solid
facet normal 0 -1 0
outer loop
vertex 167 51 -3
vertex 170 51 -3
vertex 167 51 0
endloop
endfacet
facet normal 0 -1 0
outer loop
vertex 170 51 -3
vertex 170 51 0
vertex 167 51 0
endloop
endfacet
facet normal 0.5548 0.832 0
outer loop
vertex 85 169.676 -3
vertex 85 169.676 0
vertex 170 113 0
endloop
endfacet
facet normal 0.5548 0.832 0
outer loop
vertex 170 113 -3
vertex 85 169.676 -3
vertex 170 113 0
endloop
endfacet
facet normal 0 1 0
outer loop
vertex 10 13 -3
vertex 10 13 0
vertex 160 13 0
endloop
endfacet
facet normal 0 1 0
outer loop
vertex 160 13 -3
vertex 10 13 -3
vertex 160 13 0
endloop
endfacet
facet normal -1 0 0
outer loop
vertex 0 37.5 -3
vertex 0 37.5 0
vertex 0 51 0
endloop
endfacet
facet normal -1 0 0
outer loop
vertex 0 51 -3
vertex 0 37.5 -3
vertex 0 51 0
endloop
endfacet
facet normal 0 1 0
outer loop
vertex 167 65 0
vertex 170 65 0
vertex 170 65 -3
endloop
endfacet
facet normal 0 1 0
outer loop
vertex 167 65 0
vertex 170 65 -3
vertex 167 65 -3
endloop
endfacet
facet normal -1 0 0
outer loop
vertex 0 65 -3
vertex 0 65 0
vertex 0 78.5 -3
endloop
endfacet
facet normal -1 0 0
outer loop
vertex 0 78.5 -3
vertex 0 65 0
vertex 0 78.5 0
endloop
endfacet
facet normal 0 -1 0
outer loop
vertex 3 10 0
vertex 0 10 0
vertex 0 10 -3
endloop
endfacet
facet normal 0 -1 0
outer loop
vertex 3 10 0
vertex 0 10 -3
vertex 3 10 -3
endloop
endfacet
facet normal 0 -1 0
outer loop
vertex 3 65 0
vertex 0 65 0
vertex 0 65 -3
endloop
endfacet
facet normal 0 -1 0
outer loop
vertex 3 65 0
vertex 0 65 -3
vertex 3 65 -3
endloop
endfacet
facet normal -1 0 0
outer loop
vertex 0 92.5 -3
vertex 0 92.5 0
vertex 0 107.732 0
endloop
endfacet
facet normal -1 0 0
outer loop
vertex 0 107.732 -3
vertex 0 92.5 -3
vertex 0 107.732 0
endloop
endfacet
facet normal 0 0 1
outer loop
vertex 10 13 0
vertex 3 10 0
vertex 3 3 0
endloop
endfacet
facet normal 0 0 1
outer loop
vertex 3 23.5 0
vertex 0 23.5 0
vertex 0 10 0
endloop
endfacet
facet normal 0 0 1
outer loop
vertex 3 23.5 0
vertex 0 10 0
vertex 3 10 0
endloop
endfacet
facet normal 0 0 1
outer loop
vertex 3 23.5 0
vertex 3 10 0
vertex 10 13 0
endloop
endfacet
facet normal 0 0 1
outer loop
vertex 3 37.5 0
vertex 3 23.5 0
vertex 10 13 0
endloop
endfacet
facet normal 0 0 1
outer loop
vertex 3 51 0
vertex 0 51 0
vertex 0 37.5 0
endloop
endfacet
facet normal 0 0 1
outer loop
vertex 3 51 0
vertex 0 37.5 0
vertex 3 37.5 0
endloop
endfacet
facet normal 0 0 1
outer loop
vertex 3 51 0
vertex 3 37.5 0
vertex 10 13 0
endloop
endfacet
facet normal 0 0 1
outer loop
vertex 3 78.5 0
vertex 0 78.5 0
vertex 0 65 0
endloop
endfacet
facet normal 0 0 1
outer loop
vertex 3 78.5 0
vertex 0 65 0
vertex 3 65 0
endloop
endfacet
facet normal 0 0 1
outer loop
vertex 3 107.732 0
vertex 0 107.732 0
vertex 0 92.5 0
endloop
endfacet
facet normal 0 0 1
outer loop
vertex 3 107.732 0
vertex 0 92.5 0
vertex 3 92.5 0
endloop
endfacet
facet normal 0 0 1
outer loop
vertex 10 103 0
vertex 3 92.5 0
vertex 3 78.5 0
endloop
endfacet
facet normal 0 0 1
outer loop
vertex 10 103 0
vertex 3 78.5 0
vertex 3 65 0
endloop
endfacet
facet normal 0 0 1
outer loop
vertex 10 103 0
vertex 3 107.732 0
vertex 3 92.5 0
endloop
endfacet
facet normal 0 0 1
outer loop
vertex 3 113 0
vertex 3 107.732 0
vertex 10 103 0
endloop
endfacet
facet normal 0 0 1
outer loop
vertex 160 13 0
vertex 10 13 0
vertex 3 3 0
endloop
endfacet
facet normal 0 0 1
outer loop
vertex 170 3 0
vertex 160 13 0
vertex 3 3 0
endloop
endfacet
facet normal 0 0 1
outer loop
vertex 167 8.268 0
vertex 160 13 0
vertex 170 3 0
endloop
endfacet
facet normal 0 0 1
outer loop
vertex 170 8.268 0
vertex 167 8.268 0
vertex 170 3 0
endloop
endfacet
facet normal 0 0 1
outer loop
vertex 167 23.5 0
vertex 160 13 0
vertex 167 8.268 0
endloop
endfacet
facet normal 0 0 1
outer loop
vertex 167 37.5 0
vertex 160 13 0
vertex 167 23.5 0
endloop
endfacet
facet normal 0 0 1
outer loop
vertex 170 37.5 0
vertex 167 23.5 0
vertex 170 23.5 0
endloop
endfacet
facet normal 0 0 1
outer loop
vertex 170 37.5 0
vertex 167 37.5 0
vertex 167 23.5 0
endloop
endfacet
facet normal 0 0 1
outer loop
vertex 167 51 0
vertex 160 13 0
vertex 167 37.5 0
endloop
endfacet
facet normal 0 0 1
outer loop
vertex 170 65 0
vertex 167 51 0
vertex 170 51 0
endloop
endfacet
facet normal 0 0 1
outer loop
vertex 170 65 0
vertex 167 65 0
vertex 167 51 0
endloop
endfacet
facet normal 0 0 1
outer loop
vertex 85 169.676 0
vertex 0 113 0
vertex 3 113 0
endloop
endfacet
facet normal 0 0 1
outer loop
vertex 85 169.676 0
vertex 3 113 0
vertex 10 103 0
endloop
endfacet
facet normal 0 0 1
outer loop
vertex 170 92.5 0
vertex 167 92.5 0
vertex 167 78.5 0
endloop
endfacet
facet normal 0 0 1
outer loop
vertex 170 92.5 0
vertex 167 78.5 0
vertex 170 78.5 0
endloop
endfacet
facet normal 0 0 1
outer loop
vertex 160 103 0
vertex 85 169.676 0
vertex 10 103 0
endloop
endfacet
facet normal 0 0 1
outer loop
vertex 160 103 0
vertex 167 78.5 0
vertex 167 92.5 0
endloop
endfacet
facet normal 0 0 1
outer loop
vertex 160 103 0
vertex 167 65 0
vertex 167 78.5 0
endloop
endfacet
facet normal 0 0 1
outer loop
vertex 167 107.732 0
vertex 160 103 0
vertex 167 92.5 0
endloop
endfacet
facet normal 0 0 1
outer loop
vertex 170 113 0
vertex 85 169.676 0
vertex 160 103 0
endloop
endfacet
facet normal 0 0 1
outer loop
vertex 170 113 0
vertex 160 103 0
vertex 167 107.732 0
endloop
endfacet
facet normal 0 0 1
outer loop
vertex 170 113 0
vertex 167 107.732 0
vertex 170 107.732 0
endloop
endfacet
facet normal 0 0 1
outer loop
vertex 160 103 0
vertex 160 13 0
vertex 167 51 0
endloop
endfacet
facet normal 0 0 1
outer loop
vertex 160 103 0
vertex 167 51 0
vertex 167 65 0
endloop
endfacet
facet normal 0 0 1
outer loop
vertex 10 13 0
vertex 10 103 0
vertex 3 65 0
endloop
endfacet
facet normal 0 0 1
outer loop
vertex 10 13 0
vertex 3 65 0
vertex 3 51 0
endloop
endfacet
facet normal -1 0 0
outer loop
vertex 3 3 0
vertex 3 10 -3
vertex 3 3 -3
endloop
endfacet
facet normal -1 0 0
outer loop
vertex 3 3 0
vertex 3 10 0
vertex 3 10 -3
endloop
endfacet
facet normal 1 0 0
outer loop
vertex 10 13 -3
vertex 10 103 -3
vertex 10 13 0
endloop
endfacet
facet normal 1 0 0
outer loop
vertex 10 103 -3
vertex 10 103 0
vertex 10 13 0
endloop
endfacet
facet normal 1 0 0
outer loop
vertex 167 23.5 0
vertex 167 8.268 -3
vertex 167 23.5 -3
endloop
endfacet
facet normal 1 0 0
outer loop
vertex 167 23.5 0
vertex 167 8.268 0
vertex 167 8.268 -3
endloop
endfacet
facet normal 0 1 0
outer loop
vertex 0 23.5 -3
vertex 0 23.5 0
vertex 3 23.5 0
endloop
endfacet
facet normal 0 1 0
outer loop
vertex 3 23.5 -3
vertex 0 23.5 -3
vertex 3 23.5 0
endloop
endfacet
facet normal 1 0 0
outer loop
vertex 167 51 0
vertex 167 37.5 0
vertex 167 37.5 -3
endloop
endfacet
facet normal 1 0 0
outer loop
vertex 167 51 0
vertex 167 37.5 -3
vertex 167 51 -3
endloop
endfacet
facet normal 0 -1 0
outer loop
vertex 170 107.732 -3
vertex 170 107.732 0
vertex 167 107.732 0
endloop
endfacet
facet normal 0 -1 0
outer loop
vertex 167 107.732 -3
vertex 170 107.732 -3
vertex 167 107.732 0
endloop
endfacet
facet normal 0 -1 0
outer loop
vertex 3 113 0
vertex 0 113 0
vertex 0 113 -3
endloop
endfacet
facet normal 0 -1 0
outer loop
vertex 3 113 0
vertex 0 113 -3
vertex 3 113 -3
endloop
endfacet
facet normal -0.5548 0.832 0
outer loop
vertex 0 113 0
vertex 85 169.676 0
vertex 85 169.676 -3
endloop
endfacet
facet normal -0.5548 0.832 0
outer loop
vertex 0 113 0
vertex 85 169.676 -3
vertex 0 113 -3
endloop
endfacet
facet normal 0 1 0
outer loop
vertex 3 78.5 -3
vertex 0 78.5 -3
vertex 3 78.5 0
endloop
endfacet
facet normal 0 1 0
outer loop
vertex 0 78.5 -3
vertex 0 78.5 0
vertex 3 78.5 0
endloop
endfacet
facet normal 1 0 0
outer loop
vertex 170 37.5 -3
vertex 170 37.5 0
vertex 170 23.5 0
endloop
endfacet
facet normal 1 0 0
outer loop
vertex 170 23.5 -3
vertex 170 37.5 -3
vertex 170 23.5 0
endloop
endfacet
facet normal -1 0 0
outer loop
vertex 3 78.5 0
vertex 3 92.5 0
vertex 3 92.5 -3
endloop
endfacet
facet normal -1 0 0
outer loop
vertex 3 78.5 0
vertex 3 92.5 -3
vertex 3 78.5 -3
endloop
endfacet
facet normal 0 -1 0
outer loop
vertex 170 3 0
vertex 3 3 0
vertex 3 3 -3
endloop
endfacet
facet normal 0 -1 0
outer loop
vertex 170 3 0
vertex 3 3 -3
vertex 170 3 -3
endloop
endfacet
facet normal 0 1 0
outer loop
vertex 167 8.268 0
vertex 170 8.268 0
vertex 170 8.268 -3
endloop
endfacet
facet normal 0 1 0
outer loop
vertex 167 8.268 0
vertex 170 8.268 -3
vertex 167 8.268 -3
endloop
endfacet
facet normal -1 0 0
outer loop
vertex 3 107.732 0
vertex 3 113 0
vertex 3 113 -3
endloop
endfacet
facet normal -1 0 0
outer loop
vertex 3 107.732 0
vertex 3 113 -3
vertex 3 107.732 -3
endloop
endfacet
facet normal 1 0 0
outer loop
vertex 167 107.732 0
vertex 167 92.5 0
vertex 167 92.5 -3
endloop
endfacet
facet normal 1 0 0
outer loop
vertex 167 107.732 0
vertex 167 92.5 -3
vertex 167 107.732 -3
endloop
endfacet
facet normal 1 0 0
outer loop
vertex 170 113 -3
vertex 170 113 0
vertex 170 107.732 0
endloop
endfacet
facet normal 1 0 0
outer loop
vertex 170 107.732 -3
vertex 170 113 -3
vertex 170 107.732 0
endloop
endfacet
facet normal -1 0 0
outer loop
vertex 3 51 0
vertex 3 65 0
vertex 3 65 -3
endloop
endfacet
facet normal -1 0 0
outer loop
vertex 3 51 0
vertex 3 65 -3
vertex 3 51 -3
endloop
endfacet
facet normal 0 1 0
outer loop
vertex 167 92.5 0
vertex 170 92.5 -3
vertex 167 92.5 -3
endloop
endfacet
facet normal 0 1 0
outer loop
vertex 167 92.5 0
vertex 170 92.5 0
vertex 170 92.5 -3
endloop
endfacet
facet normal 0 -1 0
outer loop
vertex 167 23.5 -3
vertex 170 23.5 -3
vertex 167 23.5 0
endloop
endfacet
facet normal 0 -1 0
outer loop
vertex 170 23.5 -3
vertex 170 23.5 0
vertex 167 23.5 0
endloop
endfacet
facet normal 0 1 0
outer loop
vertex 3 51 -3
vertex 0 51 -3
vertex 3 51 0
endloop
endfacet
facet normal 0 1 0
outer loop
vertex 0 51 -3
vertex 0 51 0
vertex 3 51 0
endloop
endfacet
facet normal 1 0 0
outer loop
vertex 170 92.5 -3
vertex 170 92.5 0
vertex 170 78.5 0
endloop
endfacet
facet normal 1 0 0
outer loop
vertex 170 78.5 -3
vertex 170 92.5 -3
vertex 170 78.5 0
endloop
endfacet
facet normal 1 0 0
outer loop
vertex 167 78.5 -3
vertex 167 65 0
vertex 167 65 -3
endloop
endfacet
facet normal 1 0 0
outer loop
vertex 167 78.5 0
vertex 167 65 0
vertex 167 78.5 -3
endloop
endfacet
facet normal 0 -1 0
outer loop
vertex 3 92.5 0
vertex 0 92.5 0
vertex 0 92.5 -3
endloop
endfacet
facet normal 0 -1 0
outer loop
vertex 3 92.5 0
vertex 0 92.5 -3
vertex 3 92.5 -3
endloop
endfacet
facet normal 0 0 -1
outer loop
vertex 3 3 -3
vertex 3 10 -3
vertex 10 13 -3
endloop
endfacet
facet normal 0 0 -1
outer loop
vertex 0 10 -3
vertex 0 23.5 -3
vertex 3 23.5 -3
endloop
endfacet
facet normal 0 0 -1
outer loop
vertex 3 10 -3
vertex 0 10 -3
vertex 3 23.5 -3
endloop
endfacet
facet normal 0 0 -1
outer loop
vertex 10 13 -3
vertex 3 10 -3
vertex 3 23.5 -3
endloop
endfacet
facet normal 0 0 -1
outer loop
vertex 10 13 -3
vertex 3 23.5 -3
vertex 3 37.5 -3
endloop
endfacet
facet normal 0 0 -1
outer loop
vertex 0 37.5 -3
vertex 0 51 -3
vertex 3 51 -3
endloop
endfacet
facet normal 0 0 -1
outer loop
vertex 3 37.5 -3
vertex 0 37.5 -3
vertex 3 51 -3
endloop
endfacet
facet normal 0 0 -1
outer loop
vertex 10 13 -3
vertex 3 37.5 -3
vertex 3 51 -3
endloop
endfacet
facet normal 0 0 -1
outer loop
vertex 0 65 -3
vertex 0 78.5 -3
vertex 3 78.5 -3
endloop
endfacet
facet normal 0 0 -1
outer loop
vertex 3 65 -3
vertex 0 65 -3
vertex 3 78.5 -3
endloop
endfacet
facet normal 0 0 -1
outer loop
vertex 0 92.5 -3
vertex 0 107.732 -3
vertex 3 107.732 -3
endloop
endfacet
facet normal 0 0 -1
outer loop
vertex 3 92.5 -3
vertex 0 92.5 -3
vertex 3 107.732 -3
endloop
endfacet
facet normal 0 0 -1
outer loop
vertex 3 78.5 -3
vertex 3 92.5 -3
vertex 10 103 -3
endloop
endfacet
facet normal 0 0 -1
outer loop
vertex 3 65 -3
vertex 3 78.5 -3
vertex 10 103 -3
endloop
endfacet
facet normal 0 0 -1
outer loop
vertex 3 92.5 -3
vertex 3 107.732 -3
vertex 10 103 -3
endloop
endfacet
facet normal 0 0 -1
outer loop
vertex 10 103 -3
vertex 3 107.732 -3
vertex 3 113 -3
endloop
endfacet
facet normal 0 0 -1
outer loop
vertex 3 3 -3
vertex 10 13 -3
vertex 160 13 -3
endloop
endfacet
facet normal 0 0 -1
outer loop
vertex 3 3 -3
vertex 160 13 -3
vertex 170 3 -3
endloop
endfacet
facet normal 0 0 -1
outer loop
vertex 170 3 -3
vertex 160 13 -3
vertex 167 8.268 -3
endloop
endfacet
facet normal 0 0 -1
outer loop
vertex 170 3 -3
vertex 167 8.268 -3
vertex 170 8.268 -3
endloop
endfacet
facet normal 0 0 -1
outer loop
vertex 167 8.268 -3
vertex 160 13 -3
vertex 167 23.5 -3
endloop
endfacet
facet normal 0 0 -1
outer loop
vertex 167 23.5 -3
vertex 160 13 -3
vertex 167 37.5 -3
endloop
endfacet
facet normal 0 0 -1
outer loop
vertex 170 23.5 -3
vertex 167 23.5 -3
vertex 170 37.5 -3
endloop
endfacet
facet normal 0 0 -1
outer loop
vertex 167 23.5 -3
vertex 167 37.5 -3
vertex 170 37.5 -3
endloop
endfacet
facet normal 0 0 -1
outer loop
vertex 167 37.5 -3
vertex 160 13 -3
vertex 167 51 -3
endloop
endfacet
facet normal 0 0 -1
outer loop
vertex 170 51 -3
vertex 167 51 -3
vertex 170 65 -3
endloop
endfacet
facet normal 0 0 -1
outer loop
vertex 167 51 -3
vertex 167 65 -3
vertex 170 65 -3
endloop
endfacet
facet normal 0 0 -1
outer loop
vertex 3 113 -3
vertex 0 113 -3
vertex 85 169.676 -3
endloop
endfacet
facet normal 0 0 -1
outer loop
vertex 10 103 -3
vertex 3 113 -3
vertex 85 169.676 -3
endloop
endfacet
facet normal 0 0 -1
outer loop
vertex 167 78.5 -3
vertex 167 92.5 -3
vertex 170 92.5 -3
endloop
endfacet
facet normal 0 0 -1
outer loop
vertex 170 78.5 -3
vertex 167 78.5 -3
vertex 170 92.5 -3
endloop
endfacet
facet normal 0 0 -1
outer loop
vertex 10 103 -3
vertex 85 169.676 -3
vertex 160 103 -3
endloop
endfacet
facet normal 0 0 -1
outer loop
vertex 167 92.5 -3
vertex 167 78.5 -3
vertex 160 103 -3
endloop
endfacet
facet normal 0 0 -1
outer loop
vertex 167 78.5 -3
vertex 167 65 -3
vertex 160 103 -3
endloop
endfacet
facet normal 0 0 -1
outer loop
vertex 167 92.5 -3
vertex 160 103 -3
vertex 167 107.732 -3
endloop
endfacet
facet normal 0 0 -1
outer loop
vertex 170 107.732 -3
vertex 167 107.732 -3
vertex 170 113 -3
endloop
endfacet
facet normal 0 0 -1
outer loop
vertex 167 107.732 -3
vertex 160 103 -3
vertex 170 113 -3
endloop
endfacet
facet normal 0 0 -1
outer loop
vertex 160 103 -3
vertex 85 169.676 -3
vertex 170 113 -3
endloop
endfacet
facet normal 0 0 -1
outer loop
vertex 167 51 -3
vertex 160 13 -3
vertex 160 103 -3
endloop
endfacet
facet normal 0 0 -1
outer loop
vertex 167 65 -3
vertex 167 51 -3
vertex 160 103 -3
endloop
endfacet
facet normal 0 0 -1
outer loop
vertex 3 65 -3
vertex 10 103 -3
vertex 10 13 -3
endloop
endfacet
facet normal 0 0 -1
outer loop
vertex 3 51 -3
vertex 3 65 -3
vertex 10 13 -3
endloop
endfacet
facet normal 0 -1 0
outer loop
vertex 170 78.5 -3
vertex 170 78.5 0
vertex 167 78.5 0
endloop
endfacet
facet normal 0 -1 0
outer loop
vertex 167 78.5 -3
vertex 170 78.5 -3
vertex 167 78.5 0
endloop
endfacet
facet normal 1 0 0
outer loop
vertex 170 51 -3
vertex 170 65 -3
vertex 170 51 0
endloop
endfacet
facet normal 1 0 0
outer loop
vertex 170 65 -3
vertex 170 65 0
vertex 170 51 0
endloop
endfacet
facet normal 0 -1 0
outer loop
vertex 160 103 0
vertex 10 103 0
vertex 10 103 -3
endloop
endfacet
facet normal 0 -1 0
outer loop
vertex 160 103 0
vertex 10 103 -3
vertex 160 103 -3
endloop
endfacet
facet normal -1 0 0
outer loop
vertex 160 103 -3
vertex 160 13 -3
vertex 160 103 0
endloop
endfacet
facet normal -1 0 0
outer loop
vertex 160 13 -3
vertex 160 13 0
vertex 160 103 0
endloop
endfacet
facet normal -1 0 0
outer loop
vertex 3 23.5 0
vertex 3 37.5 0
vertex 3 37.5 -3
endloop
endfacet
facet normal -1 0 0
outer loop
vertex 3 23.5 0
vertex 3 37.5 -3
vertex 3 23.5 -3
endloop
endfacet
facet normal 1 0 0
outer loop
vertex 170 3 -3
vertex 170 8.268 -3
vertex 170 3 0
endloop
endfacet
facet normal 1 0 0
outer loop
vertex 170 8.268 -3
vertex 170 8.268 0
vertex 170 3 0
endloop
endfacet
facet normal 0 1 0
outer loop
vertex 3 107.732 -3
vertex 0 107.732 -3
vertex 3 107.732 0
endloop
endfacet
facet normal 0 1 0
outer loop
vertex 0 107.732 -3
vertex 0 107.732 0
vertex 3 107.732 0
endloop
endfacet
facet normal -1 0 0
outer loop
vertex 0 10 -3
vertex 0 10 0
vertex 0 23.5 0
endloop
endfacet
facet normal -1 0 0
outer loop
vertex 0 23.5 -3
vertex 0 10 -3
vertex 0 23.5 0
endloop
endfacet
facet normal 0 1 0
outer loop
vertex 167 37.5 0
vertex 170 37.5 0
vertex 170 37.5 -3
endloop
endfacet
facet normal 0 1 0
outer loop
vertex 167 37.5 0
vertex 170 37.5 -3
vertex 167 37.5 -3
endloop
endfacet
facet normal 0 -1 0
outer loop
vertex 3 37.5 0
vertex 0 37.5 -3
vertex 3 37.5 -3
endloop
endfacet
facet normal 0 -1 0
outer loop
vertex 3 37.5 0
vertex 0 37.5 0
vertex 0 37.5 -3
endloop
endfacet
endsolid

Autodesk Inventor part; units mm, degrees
ref_plane "YZ Plane" through (0, 0, 0) normal (1, 0, 0) x (0, 1, 0)
ref_plane "XZ Plane" through (0, 0, 0) normal (0, 1, 0) x (-1, 0, 0)
ref_plane "XY Plane" through (0, 0, 0) normal (0, 0, 1) x (1, 0, 0)
sketch "Boceto1" plane through (0, 0, 0) normal (0, 0, 1) x (1, 0, 0)
  line L0 (0, 3) -> (170, 3) projected
  line L1 (0, 113) -> (170, 113)
  line L2 (10, 103) -> (10, 13)
  line L3 (10, 13) -> (160, 13)
  line L4 (160, 13) -> (160, 103)
  line L5 (10, 103) -> (160, 103)
  line L6 (85, 169.6763) -> (0, 113)
  line L7 (85, 169.6763) -> (170, 113)
  line L8 (0, 92.5) -> (0, 107.7321) projected
  line L9 (0, 92.5) -> (3, 92.5) projected
  line L10 (3, 107.7321) -> (3, 92.5) projected
  line L11 (0, 107.7321) -> (3, 107.7321) projected
  line L12 (3, 113) -> (3, 107.7321) projected
  line L13 (3, 92.5) -> (3, 78.5) projected
  line L14 (0, 65) -> (0, 78.5) projected
  line L15 (0, 65) -> (3, 65) projected
  line L16 (3, 78.5) -> (3, 65) projected
  line L17 (0, 78.5) -> (3, 78.5) projected
  line L18 (3, 65) -> (3, 51) projected
  line L19 (0, 37.5) -> (0, 51) projected
  line L20 (0, 37.5) -> (3, 37.5) projected
  line L21 (3, 51) -> (3, 37.5) projected
  line L22 (0, 51) -> (3, 51) projected
  line L23 (3, 37.5) -> (3, 23.5) projected
  line L24 (0, 10) -> (0, 23.5) projected
  line L25 (0, 10) -> (3, 10) projected
  line L26 (3, 23.5) -> (3, 10) projected
  line L27 (0, 23.5) -> (3, 23.5) projected
  line L28 (3, 10) -> (3, 3) projected
  line L29 (170, 113) -> (170, 107.7321) projected
  line L30 (170, 113) -> (167, 113) projected
  line L31 (167, 107.7321) -> (167, 113) projected
  line L32 (170, 107.7321) -> (167, 107.7321) projected
  line L33 (167, 92.5) -> (167, 107.7321) projected
  line L34 (170, 92.5) -> (170, 78.5) projected
  line L35 (170, 92.5) -> (167, 92.5) projected
  line L36 (167, 78.5) -> (167, 92.5) projected
  line L37 (170, 78.5) -> (167, 78.5) projected
  line L38 (167, 65) -> (167, 78.5) projected
  line L39 (170, 65) -> (170, 51) projected
  line L40 (170, 65) -> (167, 65) projected
  line L41 (167, 51) -> (167, 65) projected
  line L42 (170, 51) -> (167, 51) projected
  line L43 (167, 37.5) -> (167, 51) projected
  line L44 (170, 37.5) -> (170, 23.5) projected
  line L45 (170, 37.5) -> (167, 37.5) projected
  line L46 (167, 23.5) -> (167, 37.5) projected
  line L47 (170, 23.5) -> (167, 23.5) projected
  line L48 (167, 8.2679) -> (167, 23.5) projected
  line L49 (170, 8.2679) -> (170, 3) projected
  line L50 (170, 8.2679) -> (167, 8.2679) projected
  line L51 (167, 3) -> (167, 8.2679) projected
  line L52 (170, 3) -> (167, 3) projected
  point P0 (0, 0)
  point P1 (86.5, 171.1763)
  point P2 (83.5, 171.1763)
  dimension "d0" = 110
  dimension "d8" = 10
extrude "Extrusión1" add sketch "Boceto1" against normal blind 3
